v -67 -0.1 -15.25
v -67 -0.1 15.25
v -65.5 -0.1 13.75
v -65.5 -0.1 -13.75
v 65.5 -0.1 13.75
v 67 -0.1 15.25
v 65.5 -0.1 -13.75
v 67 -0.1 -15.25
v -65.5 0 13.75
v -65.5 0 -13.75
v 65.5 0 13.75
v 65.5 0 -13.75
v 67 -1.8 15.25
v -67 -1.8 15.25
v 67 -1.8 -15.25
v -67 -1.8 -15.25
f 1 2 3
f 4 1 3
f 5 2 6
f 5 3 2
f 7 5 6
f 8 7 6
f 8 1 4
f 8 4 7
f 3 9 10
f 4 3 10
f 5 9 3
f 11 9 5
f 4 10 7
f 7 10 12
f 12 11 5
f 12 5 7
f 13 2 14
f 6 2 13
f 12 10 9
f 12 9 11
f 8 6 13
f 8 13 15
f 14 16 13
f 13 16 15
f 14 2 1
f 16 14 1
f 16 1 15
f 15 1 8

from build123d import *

# Parameters (mm, degrees)
SKETCH_1_W           = 134
SKETCH_1_H           = 30.5
EXTRUDE_1_DEPTH      = 1.8
SKETCH_2_OUTSIDE_W   = 163.488
SKETCH_2_OUTSIDE_H   = 59.988
SKETCH_2_OUTSIDE_W_2 = 131
SKETCH_2_OUTSIDE_H_2 = 27.5
CUT_EXTRUDE_2_DEPTH  = 0.1


with BuildPart() as part:
    # Эскиз1 → Бобышка-Вытянуть1 (new body)
    with BuildSketch(Plane(origin=(0, 0, 0), x_dir=(1, 0, 0), z_dir=(0, 1, 0))):
        Rectangle(SKETCH_1_W, SKETCH_1_H)
    extrude(amount=-EXTRUDE_1_DEPTH)

    # Эскиз2 outside → Вырез-Вытянуть2 (cut)
    with BuildSketch(Plane(origin=(0, 0, 0), x_dir=(1, 0, 0), z_dir=(0, 1, 0))):
        Rectangle(SKETCH_2_OUTSIDE_W, SKETCH_2_OUTSIDE_H)
        Rectangle(SKETCH_2_OUTSIDE_W_2, SKETCH_2_OUTSIDE_H_2, mode=Mode.SUBTRACT)
    extrude(amount=-CUT_EXTRUDE_2_DEPTH, mode=Mode.SUBTRACT)


solid = part.part
